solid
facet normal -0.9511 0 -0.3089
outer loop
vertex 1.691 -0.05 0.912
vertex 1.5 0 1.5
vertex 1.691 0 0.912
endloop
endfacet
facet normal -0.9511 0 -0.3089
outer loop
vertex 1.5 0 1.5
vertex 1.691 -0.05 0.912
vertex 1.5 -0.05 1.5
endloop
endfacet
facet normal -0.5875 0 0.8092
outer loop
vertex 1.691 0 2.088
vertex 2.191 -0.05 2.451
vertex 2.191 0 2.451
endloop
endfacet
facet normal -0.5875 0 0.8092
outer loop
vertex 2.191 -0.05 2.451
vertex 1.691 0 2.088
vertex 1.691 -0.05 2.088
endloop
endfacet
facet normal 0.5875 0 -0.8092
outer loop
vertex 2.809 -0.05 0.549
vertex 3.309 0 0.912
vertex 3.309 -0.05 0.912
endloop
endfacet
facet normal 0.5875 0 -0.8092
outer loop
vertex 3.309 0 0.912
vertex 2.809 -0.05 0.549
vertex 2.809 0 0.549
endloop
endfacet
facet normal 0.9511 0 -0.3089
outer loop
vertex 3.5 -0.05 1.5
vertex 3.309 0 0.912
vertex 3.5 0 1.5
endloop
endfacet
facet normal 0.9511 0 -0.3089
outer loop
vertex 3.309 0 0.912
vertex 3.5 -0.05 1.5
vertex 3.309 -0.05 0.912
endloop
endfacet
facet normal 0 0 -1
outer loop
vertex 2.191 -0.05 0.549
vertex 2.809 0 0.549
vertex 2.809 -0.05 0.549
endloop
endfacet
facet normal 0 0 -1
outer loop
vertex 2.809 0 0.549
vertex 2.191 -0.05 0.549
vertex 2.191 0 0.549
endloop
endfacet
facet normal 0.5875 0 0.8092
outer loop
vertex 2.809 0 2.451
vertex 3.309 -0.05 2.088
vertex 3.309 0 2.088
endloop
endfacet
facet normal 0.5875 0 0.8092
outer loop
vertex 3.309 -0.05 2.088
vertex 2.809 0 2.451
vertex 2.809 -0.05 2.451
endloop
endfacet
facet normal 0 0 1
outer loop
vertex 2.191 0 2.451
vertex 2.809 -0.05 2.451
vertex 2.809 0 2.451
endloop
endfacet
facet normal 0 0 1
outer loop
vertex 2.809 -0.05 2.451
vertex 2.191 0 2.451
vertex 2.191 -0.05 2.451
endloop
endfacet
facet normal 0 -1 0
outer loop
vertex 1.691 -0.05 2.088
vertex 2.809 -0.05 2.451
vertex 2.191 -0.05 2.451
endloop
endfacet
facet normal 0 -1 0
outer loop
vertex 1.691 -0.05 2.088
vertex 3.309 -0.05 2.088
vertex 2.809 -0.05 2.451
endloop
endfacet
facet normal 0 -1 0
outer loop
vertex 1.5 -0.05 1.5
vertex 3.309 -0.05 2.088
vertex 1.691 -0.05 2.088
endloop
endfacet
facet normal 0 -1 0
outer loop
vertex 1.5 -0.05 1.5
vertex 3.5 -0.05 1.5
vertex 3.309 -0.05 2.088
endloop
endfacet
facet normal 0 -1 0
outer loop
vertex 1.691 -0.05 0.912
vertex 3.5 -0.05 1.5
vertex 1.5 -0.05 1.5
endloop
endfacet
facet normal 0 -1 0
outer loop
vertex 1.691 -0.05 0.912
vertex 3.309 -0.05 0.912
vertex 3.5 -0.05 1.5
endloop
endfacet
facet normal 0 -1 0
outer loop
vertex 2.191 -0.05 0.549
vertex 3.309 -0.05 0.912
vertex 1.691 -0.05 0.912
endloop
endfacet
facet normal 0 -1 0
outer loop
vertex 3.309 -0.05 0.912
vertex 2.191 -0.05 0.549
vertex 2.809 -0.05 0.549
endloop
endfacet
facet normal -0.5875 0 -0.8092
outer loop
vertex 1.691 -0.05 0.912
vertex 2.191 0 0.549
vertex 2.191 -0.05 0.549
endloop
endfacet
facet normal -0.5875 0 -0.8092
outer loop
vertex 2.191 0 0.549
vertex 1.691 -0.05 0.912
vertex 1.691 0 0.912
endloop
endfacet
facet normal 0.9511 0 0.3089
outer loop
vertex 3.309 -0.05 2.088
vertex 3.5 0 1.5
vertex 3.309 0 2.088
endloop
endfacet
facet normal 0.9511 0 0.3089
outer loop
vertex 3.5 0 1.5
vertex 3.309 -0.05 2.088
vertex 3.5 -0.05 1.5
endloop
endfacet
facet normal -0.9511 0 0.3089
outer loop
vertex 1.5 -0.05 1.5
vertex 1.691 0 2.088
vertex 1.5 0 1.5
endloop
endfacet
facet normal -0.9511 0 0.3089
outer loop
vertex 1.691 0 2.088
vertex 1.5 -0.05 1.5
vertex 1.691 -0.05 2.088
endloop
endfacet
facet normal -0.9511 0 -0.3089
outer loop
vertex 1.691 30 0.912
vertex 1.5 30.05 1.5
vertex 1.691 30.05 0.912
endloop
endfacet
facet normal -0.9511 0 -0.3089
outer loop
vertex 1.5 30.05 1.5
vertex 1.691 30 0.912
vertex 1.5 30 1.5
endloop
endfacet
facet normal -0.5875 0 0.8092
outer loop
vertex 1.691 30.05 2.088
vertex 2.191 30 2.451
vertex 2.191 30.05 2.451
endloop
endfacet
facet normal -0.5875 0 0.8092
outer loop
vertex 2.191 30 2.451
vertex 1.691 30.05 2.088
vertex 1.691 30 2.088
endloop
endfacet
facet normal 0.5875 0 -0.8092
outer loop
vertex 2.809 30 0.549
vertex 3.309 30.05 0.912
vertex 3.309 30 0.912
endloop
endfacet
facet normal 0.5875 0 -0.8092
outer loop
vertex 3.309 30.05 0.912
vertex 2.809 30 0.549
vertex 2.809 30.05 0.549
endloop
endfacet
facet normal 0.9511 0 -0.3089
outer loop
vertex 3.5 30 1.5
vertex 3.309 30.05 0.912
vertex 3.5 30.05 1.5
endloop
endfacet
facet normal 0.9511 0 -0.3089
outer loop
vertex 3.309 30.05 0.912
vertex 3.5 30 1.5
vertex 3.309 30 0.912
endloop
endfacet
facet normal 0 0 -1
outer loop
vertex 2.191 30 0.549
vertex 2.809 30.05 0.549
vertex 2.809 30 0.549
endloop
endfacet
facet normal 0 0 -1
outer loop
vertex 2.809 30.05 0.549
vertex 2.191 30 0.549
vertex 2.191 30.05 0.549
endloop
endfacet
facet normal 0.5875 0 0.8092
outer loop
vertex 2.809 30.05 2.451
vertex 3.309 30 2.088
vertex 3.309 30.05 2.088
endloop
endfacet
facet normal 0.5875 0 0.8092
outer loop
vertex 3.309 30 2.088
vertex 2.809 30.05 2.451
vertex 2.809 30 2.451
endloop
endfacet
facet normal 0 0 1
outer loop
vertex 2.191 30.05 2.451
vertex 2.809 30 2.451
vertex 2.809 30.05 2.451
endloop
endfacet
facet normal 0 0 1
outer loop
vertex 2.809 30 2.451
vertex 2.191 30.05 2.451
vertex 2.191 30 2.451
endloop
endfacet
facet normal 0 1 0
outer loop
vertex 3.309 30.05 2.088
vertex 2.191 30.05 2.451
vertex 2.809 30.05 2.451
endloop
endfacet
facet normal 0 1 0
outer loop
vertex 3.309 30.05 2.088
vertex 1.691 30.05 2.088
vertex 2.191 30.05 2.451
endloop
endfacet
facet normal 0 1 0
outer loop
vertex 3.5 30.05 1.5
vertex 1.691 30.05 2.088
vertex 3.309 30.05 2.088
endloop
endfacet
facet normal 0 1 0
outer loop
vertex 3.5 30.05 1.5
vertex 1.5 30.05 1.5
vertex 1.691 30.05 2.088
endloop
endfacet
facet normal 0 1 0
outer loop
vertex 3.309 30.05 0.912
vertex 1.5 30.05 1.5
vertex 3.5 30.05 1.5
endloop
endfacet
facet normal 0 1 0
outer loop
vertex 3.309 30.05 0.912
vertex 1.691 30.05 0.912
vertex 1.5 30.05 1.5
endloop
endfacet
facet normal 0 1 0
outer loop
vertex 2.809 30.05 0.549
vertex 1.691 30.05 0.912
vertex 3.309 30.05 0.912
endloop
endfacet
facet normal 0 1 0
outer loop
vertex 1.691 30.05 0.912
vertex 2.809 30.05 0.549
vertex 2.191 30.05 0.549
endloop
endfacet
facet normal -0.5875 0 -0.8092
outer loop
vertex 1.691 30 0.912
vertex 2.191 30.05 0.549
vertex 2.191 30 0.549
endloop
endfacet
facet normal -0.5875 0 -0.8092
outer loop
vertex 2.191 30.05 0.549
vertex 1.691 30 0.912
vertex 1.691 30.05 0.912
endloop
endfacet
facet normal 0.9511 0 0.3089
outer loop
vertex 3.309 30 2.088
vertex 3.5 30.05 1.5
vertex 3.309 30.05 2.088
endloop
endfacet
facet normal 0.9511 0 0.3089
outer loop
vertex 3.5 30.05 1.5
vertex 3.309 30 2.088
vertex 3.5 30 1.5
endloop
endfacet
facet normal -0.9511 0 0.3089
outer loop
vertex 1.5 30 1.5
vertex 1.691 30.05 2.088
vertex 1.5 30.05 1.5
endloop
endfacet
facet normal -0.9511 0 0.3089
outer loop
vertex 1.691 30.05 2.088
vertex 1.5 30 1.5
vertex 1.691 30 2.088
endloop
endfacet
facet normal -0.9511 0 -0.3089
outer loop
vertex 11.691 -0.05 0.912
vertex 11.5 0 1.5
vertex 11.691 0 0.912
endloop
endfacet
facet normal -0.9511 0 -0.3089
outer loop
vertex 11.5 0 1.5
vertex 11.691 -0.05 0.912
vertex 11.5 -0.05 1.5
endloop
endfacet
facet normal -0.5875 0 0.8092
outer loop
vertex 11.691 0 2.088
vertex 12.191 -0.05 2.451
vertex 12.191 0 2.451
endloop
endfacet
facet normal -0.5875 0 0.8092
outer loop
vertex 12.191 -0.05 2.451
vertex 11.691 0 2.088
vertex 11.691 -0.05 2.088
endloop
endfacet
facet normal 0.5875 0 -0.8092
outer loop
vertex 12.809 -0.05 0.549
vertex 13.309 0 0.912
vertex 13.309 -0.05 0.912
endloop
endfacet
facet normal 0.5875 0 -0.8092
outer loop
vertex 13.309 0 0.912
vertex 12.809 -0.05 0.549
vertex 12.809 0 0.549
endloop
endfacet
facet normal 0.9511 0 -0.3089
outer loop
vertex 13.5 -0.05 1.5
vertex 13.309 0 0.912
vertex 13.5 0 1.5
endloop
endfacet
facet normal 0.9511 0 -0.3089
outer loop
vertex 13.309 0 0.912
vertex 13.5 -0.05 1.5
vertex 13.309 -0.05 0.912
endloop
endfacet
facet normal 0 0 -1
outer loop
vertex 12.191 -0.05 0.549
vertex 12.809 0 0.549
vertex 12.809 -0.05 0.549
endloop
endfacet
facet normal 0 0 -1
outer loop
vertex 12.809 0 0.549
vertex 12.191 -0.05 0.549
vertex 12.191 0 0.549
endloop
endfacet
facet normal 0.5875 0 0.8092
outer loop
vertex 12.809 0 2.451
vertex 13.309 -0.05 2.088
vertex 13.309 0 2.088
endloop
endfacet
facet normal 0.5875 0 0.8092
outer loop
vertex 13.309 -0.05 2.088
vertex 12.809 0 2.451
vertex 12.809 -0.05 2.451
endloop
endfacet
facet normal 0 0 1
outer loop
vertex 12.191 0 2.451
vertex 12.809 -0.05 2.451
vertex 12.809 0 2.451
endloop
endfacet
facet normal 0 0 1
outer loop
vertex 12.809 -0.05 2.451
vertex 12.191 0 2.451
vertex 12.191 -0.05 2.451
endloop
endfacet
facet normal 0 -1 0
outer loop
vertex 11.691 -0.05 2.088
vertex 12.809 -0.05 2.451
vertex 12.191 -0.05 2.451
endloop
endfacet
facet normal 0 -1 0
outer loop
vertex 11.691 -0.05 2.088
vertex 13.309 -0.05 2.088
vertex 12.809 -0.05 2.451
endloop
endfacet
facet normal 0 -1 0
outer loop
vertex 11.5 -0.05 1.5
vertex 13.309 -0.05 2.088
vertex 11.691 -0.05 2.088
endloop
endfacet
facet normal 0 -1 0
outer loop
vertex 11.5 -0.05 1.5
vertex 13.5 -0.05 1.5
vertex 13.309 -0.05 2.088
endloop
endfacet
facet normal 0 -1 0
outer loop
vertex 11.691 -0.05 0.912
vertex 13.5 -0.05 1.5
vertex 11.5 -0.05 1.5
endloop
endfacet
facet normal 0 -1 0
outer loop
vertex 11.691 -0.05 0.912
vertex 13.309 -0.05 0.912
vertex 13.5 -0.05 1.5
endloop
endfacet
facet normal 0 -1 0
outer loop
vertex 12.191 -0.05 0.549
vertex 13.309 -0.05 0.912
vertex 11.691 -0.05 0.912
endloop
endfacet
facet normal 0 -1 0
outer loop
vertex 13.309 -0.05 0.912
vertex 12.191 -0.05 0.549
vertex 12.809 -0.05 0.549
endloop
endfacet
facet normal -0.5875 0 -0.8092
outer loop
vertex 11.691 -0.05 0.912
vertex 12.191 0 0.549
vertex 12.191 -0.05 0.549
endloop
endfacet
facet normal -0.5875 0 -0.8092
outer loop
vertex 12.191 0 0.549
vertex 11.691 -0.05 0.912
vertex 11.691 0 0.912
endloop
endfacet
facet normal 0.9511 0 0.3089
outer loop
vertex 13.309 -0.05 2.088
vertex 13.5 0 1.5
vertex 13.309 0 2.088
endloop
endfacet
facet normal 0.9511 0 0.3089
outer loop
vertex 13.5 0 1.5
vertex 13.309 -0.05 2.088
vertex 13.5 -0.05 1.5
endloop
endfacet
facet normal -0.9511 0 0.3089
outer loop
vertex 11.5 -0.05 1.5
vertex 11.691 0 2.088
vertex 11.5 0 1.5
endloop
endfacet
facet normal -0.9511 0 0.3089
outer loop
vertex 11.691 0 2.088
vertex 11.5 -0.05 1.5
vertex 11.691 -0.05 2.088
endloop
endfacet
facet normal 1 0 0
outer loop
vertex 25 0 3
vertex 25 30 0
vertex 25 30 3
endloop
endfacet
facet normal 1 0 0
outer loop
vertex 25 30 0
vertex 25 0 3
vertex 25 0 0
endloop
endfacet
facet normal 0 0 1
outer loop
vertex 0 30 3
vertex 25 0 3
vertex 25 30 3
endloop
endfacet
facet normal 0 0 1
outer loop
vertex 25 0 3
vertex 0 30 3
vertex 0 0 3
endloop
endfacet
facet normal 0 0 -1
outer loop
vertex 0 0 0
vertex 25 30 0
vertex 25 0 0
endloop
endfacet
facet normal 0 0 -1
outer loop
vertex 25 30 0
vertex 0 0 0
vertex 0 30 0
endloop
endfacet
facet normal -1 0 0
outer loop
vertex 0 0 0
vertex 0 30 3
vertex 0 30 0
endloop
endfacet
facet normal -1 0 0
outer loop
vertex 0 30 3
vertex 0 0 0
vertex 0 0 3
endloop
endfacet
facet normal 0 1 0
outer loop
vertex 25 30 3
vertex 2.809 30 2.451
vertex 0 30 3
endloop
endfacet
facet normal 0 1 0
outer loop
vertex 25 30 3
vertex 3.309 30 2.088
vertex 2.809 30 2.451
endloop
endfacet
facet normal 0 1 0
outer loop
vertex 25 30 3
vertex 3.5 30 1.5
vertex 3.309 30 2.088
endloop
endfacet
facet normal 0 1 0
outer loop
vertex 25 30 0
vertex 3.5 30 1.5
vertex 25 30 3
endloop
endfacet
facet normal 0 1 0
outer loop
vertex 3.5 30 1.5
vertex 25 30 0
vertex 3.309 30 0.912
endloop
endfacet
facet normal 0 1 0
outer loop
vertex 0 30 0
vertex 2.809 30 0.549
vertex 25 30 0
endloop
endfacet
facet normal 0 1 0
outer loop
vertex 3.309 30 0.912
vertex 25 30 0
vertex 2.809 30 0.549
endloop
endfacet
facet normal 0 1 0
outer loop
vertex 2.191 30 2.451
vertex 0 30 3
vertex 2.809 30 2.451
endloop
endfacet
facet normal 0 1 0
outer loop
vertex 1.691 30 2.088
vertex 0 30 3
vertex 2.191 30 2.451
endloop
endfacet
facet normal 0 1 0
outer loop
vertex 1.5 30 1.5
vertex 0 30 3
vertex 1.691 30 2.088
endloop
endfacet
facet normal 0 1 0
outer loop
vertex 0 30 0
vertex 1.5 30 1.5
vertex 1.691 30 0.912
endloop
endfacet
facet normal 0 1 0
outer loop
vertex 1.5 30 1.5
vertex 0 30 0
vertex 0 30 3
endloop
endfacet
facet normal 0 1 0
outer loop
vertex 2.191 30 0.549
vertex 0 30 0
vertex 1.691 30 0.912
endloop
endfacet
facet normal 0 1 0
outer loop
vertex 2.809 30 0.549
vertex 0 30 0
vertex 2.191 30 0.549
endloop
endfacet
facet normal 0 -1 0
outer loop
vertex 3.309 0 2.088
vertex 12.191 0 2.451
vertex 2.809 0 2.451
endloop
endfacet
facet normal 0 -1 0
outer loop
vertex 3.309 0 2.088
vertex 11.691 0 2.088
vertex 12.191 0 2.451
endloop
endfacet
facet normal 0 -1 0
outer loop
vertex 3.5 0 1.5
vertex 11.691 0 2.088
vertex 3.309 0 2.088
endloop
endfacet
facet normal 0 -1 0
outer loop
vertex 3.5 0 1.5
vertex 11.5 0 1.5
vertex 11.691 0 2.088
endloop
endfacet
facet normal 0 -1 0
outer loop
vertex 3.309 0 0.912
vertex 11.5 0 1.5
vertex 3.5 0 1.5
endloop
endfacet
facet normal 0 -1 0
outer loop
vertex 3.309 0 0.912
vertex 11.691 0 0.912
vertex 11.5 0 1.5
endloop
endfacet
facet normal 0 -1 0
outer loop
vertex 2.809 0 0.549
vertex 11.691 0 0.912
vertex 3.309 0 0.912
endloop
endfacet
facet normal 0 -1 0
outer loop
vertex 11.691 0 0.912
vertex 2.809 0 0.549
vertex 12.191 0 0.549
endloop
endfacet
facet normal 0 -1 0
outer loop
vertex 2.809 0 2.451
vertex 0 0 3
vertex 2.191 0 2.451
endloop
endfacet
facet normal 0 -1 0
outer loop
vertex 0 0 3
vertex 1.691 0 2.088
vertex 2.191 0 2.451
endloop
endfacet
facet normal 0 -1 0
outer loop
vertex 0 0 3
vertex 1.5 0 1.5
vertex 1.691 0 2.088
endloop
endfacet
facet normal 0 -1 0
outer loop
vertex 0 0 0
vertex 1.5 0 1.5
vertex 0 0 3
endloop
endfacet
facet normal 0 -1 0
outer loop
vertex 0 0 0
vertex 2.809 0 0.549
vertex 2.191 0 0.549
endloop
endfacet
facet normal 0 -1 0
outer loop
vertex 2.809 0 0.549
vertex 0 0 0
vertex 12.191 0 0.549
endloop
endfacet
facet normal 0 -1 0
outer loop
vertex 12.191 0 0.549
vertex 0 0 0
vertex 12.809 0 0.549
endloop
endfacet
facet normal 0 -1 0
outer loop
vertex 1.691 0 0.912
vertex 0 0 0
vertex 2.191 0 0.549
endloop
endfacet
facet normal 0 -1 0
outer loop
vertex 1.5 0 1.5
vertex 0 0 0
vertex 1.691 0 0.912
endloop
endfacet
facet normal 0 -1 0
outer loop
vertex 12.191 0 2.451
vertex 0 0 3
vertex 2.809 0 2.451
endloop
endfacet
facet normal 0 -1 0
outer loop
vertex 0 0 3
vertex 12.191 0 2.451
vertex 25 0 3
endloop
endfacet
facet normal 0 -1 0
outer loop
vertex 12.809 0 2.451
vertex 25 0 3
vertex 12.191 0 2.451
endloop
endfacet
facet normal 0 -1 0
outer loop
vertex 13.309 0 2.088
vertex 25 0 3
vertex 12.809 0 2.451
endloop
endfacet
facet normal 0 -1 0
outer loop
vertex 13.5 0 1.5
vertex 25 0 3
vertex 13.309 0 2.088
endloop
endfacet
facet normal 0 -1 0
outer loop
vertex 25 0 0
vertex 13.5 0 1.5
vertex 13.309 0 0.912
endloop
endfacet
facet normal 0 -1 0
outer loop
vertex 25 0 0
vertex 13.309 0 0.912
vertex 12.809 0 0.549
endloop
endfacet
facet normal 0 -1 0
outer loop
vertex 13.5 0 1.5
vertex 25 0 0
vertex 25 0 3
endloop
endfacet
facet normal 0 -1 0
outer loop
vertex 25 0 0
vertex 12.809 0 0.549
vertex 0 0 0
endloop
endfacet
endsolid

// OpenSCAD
//Test leaking with a simple mixer
//Print with 0.2 mm layer height and 0.3 mm first layer

base = 0.5; 
edge = 1.5; // aiming for a 1.5 mm perimeter
cd = 2; //Channel diameter
cr = cd/2; //Channel radius
dx = 20+2*edge+cd;
dy = 30;
dz = 2*base+cd;

$design = true;

//Rotations to make channel construction easier
y = [-1,0,0];
x = [0,1,0];

module c(h1=1, dir=x) {rotate(90,dir)cylinder(d=cd,h=h1,$fn=10);}
module s() {sphere(d=cd,$fa=5,$fs=0.2);}

module channels() {
    translate([edge+cr,-0.05,base+cr])c(10.05,y);
    translate([edge+cr,10,base+cr])c(20,x);
    translate([edge+cr+20,10,base+cr])c(10,y);
    translate([edge+cr,20,base+cr])c(20,x);
    translate([edge+cr,20,base+cr])c(10.05,y);
    translate([edge+cr+10,-0.05,base+cr])c(10.05,y);
    //joints
    translate([edge+cr,10,base+cr])s();
    translate([edge+cr+20,10,base+cr])s();
    translate([edge+cr+20,20,base+cr])s();
    translate([edge+cr,20,base+cr])s();   
}

module case() {
    cube([dx,dy,dz]);
}



if($design) {
    channels();
    color("blue",0.4)case();
}
else {
    
    difference(){
        case();
        channels();
    }
}
